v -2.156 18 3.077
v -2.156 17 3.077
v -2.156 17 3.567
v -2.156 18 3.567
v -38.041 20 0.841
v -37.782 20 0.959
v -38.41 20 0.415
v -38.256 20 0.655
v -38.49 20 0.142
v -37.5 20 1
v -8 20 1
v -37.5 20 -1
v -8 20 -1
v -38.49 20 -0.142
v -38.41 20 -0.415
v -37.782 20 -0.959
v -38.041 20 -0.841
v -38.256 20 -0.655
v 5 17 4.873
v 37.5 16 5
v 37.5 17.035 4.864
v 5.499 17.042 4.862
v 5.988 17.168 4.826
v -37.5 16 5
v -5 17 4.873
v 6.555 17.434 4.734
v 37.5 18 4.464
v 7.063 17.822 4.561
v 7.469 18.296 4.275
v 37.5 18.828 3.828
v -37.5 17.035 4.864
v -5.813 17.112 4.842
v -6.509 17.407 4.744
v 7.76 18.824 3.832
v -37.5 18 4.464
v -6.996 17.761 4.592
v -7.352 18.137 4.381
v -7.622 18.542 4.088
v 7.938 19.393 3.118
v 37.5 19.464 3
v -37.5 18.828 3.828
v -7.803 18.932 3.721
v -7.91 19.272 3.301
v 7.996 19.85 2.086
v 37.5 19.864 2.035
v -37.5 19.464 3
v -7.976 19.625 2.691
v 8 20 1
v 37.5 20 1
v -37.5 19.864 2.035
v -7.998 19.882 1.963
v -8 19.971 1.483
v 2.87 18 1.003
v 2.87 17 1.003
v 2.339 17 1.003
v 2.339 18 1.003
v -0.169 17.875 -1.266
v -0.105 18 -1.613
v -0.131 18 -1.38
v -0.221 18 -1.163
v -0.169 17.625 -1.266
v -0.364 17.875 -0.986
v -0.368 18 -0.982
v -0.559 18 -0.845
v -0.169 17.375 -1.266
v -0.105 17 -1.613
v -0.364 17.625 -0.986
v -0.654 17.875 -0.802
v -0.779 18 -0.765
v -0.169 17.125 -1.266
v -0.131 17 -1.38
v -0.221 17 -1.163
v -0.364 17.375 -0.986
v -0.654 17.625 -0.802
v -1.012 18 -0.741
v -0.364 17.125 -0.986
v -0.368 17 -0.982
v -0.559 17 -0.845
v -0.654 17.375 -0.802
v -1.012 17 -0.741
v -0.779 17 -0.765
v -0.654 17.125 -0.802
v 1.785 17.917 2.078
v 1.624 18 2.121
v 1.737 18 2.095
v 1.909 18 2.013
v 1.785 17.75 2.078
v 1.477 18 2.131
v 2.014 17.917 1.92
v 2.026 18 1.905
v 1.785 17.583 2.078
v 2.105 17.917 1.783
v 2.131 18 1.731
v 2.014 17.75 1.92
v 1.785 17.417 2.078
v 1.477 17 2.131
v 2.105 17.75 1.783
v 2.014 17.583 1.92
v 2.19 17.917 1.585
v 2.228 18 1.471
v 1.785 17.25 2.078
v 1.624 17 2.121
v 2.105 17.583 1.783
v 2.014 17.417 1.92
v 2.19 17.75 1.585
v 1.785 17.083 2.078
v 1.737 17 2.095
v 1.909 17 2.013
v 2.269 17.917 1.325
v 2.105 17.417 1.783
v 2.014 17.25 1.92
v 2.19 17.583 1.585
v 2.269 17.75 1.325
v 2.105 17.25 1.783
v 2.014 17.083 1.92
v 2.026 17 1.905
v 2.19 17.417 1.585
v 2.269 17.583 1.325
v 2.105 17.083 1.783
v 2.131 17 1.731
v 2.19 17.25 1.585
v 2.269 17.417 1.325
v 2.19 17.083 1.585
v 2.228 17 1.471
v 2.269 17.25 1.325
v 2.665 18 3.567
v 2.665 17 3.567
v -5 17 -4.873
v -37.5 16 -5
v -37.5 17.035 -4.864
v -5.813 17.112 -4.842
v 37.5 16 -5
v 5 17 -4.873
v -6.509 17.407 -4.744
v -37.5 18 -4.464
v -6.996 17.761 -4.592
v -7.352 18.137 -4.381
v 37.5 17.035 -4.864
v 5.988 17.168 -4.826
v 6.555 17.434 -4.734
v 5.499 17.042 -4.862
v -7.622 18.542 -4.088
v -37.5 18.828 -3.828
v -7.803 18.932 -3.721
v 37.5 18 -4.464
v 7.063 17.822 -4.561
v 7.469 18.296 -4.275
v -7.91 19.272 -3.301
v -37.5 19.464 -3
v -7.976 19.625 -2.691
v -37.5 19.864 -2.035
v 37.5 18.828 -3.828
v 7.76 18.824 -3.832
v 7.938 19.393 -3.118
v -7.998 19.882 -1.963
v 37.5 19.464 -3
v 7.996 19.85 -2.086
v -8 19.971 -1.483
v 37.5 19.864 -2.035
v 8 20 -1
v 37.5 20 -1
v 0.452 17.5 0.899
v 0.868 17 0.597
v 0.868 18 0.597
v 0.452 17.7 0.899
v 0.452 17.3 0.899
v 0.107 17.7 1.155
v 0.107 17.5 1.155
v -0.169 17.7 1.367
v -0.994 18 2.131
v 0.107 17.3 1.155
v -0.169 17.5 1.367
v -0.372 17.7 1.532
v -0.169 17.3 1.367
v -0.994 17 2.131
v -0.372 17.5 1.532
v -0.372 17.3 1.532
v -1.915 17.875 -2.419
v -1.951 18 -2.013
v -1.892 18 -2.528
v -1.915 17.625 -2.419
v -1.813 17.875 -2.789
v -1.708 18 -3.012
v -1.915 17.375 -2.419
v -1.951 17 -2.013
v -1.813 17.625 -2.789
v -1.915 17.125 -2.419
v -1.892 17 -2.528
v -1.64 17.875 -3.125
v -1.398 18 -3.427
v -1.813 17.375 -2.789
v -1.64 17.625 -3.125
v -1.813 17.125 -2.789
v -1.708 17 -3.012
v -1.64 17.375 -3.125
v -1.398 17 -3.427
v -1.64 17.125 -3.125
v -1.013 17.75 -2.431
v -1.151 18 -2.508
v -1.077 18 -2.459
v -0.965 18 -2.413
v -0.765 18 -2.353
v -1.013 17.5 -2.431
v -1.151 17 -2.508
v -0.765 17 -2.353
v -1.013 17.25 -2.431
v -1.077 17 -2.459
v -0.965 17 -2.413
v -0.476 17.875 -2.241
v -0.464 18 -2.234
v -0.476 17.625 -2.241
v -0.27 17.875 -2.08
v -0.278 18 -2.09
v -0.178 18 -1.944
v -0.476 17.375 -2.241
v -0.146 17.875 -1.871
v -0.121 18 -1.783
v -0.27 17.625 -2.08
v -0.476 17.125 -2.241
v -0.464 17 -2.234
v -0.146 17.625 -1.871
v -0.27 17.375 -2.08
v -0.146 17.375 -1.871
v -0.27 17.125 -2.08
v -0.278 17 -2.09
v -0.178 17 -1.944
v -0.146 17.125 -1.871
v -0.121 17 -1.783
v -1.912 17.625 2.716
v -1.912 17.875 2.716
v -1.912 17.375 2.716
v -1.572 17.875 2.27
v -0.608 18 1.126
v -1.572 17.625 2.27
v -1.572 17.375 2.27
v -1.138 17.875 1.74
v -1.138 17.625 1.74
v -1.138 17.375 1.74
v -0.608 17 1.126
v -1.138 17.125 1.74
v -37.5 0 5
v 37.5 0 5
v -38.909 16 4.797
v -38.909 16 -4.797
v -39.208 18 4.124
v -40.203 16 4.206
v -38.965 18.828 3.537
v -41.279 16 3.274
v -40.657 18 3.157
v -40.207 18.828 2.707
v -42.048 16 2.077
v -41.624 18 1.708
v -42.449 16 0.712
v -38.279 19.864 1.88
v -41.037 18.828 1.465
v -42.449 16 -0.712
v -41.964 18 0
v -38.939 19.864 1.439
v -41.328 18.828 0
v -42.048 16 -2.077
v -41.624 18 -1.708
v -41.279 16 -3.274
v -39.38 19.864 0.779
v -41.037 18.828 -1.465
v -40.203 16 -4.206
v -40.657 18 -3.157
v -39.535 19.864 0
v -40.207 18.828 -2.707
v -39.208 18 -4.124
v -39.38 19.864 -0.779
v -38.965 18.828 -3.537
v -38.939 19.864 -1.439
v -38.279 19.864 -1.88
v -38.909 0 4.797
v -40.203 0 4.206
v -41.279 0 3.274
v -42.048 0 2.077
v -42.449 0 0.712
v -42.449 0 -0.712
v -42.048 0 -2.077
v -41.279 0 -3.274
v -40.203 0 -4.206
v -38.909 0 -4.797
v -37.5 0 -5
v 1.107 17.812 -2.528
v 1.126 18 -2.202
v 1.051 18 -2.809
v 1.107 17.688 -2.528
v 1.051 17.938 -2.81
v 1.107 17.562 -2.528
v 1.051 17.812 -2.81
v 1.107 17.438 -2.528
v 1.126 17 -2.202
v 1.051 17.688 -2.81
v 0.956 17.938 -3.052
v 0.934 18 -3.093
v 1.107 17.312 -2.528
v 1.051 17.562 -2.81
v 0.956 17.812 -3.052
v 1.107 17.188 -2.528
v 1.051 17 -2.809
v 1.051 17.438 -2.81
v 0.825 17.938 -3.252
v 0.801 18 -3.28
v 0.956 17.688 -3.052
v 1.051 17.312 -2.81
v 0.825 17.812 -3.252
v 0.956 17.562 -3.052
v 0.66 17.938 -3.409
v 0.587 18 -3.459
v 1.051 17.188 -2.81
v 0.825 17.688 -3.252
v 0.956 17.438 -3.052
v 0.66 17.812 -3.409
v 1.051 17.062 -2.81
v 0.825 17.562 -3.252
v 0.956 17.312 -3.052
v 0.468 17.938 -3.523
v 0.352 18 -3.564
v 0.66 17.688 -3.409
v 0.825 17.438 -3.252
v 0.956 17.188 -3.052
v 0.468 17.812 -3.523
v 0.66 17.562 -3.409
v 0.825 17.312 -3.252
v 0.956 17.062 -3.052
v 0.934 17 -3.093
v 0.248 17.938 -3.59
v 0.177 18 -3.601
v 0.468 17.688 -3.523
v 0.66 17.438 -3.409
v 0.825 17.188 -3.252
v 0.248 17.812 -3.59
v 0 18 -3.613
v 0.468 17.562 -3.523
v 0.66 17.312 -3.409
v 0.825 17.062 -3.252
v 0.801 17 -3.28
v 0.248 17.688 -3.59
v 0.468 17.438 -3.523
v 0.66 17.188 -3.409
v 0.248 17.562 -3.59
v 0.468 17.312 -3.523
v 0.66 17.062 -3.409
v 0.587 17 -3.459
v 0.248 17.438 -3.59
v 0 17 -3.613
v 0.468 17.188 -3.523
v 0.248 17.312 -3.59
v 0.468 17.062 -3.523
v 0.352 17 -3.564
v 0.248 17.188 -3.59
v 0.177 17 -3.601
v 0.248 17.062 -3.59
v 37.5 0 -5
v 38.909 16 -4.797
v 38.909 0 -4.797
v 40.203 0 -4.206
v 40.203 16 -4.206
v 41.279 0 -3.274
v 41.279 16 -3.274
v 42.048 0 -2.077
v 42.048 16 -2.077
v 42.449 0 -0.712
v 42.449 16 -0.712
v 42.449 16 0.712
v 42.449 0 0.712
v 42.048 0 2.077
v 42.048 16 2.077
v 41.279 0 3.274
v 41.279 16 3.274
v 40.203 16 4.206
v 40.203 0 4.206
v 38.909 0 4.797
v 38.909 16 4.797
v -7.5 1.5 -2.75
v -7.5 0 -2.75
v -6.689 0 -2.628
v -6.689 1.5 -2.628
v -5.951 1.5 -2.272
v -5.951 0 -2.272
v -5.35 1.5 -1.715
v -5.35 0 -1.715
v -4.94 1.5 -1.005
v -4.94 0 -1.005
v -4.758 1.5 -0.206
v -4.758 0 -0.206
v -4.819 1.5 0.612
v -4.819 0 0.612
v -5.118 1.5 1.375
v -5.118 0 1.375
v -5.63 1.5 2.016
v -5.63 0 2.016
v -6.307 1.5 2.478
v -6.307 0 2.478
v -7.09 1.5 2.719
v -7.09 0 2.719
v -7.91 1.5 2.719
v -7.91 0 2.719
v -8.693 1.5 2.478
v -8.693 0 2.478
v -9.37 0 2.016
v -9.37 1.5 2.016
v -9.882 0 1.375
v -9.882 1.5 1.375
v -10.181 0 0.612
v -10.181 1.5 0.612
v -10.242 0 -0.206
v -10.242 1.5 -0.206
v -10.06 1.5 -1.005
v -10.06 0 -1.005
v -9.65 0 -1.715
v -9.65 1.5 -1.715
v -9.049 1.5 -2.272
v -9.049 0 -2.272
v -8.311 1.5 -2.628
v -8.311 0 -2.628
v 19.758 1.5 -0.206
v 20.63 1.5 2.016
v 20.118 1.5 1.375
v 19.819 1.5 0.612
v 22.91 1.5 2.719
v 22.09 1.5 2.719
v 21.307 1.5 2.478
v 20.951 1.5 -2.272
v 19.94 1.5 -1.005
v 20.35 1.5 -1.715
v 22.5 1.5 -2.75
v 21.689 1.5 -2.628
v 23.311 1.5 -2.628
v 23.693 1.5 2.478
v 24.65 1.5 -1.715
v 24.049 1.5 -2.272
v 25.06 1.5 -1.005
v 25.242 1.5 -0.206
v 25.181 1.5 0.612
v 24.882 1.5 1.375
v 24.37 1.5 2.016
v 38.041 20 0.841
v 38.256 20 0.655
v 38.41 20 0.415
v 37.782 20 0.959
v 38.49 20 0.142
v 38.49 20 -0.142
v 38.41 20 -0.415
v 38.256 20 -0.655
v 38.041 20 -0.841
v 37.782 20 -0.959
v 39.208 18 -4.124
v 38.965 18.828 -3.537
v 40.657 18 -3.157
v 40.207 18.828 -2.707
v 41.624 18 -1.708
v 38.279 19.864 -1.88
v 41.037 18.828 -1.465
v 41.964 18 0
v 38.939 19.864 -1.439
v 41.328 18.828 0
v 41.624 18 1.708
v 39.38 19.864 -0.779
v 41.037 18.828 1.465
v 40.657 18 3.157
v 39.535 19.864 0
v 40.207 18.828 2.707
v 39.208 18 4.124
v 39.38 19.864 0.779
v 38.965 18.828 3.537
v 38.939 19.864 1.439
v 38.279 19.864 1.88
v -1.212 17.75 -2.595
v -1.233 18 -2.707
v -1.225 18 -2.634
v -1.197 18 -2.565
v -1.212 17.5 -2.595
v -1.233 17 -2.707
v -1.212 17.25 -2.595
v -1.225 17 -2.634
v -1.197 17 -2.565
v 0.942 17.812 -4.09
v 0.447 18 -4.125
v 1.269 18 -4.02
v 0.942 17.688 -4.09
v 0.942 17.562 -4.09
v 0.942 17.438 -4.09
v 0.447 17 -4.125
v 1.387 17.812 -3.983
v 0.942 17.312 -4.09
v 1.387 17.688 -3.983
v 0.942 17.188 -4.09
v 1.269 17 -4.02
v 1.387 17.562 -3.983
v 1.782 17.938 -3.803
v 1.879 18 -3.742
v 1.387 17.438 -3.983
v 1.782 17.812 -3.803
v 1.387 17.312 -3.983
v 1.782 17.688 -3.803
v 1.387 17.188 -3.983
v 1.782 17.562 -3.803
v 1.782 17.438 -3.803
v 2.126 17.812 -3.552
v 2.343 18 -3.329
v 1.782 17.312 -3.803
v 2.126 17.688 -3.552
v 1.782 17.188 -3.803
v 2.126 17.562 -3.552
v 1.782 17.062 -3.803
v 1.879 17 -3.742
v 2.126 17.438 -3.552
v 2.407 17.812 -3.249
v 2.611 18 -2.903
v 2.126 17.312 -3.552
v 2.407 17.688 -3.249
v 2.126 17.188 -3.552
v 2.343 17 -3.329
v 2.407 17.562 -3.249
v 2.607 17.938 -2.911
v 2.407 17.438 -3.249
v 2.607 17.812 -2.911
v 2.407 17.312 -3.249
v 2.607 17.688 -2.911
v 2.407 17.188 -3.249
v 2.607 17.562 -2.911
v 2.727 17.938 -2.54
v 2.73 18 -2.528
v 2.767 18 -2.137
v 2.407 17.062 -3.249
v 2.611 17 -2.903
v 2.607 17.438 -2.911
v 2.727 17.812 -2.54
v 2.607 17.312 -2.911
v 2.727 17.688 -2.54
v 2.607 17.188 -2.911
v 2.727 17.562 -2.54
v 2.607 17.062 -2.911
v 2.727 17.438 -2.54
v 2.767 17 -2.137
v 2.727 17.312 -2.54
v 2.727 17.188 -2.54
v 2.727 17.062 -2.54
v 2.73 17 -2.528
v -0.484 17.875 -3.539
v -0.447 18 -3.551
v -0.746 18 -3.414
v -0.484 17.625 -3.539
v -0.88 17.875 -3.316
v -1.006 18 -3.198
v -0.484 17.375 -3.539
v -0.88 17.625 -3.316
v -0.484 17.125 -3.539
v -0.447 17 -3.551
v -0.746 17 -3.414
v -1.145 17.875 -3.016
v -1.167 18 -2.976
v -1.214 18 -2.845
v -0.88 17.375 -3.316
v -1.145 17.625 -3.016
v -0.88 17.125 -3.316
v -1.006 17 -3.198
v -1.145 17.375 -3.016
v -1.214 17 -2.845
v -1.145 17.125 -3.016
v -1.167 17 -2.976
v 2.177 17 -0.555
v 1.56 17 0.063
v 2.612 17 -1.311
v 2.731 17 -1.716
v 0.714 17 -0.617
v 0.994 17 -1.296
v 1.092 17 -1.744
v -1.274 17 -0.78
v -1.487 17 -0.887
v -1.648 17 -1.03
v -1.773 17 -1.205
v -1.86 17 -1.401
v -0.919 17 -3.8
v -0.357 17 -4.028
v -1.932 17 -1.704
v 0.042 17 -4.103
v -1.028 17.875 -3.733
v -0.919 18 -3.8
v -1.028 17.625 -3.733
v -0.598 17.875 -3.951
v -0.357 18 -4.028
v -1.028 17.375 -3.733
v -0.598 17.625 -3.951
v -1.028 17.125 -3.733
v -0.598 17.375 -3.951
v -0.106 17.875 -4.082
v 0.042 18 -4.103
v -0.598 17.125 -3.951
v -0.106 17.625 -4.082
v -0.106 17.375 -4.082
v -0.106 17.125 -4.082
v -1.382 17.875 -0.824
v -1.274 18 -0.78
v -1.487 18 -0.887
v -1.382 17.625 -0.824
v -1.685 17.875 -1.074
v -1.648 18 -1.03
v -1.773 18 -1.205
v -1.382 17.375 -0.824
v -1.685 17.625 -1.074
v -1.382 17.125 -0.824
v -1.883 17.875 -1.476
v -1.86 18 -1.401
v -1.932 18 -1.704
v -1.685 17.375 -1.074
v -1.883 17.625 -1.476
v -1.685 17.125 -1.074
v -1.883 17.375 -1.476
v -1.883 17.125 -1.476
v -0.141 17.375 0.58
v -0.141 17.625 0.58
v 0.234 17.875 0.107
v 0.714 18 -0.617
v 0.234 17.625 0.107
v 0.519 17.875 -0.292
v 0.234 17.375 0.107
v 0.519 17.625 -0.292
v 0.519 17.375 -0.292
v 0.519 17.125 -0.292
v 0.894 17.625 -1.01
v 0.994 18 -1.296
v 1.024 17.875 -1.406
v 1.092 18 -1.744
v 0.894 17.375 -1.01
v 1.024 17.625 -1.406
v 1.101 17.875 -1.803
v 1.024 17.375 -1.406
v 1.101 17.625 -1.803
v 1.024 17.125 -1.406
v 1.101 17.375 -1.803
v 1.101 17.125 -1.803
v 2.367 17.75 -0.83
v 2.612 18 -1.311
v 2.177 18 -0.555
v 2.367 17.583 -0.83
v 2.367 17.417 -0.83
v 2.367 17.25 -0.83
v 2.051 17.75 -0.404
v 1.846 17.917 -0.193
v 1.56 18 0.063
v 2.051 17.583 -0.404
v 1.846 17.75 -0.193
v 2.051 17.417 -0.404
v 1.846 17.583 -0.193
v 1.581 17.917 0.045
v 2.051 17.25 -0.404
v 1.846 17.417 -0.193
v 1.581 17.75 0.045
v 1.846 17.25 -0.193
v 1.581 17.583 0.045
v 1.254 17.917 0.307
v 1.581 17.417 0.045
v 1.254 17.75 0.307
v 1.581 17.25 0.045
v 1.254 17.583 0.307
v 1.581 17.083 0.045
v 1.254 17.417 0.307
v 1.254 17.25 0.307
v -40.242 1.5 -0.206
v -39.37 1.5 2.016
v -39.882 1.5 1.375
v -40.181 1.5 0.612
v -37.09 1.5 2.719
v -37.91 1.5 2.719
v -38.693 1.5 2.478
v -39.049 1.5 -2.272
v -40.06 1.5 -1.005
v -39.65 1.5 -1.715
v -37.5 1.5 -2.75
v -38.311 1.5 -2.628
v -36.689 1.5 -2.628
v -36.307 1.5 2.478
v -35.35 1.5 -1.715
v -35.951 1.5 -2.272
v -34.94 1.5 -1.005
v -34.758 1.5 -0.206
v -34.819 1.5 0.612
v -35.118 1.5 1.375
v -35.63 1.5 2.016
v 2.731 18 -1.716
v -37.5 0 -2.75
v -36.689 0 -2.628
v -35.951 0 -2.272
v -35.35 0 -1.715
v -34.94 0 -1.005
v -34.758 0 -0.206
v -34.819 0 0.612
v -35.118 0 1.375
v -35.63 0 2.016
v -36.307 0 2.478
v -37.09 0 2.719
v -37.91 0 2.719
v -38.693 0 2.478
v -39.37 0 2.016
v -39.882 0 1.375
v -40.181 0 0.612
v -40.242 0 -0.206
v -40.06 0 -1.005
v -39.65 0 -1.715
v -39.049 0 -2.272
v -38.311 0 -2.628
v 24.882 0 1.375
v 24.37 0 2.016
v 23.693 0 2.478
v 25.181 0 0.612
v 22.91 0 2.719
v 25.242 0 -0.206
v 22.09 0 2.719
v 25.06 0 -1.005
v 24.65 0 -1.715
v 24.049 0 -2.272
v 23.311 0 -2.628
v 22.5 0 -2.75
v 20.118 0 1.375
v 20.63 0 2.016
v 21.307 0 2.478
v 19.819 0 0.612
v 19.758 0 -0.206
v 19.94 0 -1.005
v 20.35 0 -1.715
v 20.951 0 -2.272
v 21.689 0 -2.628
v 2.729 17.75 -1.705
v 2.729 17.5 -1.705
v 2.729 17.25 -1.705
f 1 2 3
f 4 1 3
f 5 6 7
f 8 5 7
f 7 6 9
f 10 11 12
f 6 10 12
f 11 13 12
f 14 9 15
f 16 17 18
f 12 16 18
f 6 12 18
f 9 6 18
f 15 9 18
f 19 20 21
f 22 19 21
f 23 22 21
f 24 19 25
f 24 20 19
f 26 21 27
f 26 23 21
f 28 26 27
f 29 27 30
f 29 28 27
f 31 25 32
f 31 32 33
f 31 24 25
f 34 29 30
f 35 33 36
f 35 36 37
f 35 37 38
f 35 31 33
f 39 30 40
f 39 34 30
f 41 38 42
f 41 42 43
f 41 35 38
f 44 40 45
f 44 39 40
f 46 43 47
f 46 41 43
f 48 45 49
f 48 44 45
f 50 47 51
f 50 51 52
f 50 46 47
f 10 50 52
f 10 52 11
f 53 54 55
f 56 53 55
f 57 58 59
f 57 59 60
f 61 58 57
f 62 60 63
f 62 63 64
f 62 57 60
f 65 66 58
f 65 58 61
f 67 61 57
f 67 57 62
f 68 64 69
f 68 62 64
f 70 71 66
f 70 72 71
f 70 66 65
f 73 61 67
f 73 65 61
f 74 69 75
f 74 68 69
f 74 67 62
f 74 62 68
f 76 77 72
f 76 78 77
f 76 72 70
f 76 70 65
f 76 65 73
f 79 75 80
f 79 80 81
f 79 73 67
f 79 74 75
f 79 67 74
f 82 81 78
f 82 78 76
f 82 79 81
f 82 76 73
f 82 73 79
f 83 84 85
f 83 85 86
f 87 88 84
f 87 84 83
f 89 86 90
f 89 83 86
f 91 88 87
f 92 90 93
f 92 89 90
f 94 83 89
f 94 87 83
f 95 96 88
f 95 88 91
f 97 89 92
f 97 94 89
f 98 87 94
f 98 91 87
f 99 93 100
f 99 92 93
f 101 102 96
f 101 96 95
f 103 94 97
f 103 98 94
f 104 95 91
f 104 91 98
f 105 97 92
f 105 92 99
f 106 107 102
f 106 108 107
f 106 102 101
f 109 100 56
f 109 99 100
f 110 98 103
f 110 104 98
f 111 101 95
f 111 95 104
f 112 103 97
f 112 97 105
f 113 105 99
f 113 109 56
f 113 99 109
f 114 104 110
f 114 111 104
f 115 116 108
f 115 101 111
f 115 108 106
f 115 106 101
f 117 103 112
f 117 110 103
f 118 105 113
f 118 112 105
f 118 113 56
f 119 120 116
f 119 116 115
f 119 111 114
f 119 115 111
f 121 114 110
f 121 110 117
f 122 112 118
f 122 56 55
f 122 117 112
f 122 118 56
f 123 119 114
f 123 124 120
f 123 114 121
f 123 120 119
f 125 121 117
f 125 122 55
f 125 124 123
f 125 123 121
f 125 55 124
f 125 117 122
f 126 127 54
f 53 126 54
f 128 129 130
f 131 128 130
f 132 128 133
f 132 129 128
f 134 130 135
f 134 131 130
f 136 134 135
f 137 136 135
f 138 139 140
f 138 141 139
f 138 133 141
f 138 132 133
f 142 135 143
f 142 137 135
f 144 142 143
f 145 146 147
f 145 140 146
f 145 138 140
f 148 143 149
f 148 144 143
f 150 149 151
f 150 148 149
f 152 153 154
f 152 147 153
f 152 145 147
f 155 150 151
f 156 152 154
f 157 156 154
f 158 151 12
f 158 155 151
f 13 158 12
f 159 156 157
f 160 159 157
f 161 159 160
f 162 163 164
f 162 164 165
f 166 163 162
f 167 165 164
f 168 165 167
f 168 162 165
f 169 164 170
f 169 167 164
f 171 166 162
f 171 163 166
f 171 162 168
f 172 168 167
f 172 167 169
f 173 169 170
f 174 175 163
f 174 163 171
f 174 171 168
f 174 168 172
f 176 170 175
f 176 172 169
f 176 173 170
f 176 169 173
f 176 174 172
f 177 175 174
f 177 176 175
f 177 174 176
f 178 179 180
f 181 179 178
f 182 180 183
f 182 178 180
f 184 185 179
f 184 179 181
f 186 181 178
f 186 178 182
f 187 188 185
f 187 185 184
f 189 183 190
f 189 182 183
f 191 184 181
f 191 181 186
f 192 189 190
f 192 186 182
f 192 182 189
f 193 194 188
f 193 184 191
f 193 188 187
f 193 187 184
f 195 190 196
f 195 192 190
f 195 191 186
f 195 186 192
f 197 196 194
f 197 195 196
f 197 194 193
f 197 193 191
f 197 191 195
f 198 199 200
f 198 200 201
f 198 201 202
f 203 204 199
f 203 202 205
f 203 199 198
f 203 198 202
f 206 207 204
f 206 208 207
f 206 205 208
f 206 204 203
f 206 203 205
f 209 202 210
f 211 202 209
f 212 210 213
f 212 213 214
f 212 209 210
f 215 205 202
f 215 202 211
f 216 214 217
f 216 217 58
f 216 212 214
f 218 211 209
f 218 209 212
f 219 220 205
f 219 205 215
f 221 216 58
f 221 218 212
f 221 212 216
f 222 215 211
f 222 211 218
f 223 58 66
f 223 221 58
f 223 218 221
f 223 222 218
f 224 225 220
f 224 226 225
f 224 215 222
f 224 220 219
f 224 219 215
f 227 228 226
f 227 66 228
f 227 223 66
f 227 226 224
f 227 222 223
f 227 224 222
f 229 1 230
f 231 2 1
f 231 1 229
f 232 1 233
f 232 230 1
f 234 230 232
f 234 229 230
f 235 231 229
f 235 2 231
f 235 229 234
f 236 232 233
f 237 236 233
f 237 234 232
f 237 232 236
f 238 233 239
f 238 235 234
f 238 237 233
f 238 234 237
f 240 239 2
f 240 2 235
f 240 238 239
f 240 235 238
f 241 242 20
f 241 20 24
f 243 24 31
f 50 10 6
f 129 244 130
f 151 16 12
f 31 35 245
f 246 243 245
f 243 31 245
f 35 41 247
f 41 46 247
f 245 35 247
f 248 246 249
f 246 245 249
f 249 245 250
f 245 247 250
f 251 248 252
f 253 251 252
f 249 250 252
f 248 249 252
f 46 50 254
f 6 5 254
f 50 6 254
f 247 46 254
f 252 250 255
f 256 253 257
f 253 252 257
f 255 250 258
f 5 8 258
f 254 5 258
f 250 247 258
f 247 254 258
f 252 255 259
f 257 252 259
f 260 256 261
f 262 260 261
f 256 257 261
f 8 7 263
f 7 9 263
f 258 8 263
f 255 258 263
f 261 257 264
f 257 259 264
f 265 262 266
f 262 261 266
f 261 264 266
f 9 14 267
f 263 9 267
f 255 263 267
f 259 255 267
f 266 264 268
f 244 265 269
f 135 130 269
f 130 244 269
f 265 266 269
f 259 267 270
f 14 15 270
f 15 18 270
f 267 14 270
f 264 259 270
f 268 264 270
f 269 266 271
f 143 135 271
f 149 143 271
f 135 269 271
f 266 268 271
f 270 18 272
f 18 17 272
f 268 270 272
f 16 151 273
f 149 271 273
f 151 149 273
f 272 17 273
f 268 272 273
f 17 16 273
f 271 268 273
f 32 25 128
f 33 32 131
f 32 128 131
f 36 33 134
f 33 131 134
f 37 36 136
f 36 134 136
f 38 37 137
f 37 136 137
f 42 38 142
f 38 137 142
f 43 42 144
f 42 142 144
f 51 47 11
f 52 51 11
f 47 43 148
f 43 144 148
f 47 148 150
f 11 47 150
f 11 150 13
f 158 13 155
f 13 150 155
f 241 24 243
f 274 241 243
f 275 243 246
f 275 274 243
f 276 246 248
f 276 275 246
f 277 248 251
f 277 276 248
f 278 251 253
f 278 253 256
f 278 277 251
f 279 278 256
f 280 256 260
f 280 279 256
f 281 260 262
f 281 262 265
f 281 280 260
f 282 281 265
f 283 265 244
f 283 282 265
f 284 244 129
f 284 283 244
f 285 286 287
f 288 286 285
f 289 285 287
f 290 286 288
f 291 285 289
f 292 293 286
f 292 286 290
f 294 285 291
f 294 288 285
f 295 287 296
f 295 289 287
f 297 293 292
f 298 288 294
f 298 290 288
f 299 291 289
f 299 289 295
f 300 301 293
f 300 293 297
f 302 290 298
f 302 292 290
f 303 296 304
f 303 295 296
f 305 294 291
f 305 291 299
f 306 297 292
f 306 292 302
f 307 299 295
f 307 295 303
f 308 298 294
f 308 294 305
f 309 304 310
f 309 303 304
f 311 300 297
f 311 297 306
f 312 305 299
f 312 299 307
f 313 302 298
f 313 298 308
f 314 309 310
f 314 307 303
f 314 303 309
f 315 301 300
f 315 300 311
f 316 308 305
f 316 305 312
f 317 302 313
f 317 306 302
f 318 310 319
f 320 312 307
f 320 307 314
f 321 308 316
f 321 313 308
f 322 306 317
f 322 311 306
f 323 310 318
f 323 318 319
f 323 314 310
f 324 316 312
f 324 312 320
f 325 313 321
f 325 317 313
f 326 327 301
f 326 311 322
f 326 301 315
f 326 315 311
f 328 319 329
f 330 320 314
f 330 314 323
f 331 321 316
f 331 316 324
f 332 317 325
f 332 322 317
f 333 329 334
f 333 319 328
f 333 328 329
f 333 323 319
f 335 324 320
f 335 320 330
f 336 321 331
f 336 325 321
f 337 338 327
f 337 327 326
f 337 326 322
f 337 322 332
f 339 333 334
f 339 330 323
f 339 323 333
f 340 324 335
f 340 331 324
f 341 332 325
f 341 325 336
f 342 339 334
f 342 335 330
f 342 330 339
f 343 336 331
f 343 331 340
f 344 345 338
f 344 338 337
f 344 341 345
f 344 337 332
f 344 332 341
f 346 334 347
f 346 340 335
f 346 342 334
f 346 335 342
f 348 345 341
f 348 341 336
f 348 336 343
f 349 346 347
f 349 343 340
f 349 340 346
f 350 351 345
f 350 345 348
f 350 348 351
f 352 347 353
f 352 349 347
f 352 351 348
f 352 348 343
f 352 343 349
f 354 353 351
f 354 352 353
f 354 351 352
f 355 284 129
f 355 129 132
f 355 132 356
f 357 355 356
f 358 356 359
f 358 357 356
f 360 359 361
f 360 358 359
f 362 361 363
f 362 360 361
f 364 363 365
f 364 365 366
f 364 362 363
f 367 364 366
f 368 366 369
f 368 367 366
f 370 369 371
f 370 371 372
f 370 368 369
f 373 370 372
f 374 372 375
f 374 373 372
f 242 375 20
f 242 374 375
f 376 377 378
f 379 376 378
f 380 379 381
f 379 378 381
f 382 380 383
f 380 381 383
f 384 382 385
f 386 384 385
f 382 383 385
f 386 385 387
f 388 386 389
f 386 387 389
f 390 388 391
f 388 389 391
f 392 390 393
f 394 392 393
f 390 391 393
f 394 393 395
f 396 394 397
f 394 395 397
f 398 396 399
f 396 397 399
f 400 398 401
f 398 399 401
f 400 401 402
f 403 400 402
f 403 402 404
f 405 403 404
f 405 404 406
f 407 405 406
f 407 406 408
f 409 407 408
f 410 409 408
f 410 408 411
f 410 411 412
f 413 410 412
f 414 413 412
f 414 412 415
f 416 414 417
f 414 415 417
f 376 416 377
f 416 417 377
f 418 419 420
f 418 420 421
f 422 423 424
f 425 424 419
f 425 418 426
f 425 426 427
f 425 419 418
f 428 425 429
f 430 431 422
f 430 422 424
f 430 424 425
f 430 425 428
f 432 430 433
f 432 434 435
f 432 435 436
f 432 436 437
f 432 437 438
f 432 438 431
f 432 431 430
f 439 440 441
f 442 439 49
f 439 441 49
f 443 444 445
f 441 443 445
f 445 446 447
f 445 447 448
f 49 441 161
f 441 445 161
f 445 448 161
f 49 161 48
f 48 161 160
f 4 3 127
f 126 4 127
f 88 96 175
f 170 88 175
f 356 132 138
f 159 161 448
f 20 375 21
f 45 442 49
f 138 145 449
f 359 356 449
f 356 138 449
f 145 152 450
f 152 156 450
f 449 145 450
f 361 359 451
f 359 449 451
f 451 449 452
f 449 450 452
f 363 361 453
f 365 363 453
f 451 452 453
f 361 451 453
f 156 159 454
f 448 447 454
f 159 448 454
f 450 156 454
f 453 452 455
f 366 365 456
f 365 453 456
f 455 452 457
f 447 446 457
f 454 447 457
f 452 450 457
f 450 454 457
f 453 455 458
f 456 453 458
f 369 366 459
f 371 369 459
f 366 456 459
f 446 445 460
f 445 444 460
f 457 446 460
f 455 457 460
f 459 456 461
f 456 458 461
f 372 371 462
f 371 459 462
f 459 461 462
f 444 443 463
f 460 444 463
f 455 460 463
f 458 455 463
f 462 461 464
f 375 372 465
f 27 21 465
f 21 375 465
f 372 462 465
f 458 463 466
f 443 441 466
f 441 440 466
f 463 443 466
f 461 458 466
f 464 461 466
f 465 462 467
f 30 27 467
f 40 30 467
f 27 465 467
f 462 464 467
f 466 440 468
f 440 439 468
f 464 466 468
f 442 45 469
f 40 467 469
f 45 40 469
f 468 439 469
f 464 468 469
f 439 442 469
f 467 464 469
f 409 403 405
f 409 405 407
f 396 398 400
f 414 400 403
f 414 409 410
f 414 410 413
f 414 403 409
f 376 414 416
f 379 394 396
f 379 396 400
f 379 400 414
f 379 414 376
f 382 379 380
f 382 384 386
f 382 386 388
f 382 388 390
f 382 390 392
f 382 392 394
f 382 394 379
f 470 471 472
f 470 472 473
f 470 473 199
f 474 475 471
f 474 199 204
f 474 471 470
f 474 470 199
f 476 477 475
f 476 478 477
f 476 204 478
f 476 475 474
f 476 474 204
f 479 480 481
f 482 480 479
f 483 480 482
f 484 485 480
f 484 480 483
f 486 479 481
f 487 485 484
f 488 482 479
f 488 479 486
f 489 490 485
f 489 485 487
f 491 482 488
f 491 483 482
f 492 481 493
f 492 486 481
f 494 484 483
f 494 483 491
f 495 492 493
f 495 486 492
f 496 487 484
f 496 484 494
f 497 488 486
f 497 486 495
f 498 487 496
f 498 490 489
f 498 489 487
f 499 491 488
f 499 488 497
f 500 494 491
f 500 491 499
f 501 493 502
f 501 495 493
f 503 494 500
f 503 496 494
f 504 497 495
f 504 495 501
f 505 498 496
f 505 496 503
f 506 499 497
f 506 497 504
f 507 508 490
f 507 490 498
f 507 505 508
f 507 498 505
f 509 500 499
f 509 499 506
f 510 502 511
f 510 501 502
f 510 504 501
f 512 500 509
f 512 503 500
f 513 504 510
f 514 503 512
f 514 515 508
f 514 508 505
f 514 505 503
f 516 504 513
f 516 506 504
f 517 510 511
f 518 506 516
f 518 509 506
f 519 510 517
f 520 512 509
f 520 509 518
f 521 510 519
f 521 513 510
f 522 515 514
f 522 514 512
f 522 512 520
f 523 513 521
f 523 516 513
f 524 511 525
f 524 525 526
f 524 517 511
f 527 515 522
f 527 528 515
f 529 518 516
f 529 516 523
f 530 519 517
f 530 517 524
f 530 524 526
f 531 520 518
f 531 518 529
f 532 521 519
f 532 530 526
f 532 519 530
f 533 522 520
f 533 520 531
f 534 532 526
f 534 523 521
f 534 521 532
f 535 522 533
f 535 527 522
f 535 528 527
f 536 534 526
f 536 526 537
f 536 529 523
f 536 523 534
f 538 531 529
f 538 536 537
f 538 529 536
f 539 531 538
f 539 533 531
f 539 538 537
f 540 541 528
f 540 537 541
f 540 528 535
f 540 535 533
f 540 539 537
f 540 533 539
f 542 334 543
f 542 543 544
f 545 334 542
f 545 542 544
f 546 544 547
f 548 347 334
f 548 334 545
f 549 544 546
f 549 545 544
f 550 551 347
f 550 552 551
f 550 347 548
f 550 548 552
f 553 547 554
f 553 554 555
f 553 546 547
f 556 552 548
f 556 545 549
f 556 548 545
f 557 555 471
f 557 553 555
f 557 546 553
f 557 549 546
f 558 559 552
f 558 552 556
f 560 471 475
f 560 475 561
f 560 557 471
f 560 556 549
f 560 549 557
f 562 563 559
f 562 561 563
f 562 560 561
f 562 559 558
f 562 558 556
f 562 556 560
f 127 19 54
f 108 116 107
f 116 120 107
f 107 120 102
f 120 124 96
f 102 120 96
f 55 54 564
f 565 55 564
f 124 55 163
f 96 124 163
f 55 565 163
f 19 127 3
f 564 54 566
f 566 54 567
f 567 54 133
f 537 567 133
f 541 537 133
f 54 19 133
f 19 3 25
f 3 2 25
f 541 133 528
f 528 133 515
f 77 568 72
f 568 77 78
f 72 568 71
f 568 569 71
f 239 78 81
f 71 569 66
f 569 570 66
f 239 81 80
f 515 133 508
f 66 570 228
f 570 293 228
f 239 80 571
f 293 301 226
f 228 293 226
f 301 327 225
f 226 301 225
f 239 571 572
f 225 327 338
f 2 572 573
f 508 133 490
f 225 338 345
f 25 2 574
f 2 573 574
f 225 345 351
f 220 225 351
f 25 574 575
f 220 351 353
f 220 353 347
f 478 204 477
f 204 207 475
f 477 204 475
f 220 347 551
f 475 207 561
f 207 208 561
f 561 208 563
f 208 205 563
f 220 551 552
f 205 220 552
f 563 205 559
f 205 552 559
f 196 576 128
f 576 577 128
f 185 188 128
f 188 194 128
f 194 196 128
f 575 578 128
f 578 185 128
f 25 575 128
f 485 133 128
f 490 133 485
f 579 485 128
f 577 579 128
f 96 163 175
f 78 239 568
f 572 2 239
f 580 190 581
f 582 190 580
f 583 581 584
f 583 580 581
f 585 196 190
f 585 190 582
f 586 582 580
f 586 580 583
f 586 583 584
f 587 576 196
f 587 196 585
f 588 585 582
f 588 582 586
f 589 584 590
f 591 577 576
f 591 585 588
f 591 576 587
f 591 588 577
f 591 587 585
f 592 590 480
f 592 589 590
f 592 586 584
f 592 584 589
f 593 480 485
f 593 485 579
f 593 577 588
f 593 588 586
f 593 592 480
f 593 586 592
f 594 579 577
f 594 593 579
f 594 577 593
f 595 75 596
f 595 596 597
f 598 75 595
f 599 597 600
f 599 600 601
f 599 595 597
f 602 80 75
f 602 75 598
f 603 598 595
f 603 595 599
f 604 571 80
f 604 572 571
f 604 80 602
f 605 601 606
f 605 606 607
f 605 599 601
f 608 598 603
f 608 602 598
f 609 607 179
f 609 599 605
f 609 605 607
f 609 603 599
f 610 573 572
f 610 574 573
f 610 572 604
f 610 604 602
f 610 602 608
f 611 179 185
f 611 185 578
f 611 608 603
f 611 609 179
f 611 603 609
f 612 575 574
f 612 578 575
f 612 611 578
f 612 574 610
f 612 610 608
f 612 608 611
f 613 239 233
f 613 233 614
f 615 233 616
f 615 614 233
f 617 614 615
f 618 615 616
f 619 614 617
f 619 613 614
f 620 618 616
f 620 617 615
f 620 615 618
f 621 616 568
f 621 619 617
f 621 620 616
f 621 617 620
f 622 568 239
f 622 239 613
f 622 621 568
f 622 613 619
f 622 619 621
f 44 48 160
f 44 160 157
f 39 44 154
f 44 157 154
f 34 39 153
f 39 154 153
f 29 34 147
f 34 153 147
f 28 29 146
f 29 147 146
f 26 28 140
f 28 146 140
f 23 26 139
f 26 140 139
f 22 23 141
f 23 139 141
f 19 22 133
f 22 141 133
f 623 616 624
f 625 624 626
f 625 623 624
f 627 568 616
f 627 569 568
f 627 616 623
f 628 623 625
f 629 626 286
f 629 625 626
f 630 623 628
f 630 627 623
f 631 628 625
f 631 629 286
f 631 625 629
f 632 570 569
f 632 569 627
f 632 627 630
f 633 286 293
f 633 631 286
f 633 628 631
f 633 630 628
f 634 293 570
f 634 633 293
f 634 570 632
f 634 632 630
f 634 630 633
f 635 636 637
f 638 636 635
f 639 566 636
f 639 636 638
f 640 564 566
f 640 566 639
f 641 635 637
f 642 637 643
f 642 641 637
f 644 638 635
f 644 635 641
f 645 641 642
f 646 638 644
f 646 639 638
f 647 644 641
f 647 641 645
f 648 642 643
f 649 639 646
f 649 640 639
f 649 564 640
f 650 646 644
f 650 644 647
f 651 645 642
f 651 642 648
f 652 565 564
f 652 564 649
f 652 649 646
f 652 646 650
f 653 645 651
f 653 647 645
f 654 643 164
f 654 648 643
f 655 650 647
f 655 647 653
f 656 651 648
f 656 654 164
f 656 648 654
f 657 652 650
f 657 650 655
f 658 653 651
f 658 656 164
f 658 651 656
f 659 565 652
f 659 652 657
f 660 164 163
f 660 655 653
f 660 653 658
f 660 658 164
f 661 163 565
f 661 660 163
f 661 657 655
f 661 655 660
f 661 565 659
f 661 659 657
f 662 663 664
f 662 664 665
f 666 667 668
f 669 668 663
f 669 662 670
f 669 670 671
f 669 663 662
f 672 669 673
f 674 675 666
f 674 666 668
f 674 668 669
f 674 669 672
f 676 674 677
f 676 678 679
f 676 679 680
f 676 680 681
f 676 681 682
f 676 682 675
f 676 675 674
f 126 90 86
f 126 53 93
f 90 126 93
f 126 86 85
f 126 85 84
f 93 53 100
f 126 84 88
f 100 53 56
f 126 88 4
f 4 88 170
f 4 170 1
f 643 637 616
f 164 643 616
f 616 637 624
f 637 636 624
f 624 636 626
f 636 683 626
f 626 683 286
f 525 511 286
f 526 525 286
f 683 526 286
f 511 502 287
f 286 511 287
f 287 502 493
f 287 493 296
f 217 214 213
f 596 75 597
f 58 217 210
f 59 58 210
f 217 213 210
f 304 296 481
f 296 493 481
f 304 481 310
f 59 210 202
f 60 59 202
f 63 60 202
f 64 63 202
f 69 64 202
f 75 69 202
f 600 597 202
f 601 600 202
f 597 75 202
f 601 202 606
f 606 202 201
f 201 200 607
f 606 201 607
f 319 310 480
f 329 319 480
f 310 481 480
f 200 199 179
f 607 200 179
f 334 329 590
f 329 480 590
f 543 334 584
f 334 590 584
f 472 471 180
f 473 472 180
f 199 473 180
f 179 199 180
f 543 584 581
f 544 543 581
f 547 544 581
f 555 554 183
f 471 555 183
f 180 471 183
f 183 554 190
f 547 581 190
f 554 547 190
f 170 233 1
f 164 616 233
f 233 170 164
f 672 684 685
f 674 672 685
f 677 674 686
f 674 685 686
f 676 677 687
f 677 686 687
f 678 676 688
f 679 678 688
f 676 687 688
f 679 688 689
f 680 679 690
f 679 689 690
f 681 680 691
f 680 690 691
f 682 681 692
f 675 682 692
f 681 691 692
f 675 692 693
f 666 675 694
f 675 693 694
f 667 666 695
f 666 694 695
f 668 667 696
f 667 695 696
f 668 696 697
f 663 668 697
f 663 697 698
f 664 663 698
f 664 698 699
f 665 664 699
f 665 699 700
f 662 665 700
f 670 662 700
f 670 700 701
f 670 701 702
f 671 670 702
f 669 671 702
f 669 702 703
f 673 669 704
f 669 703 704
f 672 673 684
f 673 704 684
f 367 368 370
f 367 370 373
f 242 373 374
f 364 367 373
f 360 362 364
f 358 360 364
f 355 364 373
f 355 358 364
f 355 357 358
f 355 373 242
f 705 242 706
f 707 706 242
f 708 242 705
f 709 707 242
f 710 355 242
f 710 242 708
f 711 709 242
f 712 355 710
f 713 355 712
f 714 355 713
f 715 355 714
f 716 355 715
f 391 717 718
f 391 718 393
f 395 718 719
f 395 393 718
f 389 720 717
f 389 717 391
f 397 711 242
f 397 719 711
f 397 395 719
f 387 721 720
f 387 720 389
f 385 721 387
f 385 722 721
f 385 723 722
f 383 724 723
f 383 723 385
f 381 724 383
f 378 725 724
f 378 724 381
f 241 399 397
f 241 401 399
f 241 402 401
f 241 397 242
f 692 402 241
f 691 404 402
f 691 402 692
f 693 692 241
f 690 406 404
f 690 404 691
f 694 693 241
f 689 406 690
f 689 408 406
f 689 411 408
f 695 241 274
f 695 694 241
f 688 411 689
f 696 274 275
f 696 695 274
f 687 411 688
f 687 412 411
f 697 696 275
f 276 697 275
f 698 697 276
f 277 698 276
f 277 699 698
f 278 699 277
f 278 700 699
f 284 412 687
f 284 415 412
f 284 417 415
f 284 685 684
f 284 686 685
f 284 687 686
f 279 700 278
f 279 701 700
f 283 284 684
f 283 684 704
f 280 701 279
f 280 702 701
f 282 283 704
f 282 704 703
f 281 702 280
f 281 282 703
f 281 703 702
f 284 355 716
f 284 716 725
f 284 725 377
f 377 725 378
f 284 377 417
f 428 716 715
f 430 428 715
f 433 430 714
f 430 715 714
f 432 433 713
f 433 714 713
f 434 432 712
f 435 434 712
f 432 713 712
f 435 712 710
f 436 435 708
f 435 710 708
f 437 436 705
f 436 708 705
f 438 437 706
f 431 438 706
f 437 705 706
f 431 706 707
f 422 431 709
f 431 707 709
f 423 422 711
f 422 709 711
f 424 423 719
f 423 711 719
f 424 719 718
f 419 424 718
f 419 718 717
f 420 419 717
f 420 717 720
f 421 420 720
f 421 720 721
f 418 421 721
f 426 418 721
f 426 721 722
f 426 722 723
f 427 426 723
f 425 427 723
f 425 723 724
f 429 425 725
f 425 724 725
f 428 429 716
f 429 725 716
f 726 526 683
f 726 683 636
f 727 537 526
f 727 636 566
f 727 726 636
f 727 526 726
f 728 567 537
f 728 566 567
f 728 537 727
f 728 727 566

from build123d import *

# Parameters (mm, degrees)
BOSS_EXTRUDE1_DEPTH     = 20
FILLET1_R               = 4
SKETCH2_R               = 2.75
CUT_EXTRUDE1_DEPTH      = 1.5
LPATTERN1_COUNT         = 3
LPATTERN1_PITCH         = 30
CUT_EXTRUDE2_DEPTH      = 48.236109069
CUT_EXTRUDE2_DEPTH_BACK = 48.236109069
WRAP1_DEPTH             = 1


# Read off the part's stored shape, not the designer's step: Wrap1
with BuildPart() as part:
    # Sketch1 → Boss-Extrude1 (new body)
    with BuildSketch(Plane(origin=(0, 0, 0), x_dir=(1, 0, 0), z_dir=(0, 1, 0))):
        with BuildLine():
            Line((37.5, -5), (-37.5, -5))
            ThreePointArc((-37.5, -5), (-42.5, 0), (-37.5, 5))
            Line((-37.5, 5), (37.5, 5))
            ThreePointArc((37.5, 5), (42.5, 0), (37.5, -5))
        make_face()
    extrude(amount=BOSS_EXTRUDE1_DEPTH)

    # Fillet1
    fillet1_edges = [part.edges().sort_by_distance(p)[0] for p in [
        (-42.5, 20, 0),
        (0, 20, 5),
        (42.5, 20, 0),
        (0, 20, -5),
    ]]
    fillet(fillet1_edges, radius=FILLET1_R)

    # Sketch2 → Cut-Extrude1 (cut)
    with BuildSketch(Plane.XZ):
        with Locations(Location((-37.5, 0, 0), (0, 0, 270))):
            Circle(SKETCH2_R)
    cut_extrude1 = extrude(amount=-CUT_EXTRUDE1_DEPTH, mode=Mode.SUBTRACT)

    # LPattern1: Cut-Extrude1 ×3
    with Locations(*[(i * LPATTERN1_PITCH, 0, 0) for i in range(1, LPATTERN1_COUNT)]):
        add(cut_extrude1, mode=Mode.SUBTRACT)

    # Sketch3 → Cut-Extrude2 (cut, two sides: drawn at the far end of the back side and taken through both)
    with BuildSketch(Plane.XY.offset(-CUT_EXTRUDE2_DEPTH_BACK)):
        with BuildLine():
            Line((-5, 23), (5, 23))
            ThreePointArc((5, 23), (8, 20), (5, 17))
            Line((5, 17), (-5, 17))
            ThreePointArc((-5, 17), (-8, 20), (-5, 23))
        make_face()
    extrude(amount=CUT_EXTRUDE2_DEPTH + CUT_EXTRUDE2_DEPTH_BACK, mode=Mode.SUBTRACT)

    # Wrap1 outline → Wrap1 (add)
    with BuildSketch(Plane(origin=(0, 17, 0), x_dir=(1, 0, 0), z_dir=(0, 1, 0))):
        with BuildLine():
            add(Edge.make_bspline(
                [(1.477179672, -2.131048558), (1.531961531, -2.129025799), (1.636756934, -2.125156347), (1.784042683, -2.083710764), (1.912739128, -2.017798162), (2.002734413, -1.937441096), (2.063880351, -1.856422731), (2.108803156, -1.780024303), (2.151677105, -1.688112446), (2.192727948, -1.580807318), (2.232736726, -1.458316815), (2.27140835, -1.320528166), (2.305449427, -1.166588854), (2.327738483, -1.058958074), (2.339359159, -1.00284343)],
                knots=[0, 0, 0, 0, 0.10403341, 0.199011557, 0.288612319, 0.377191825, 0.425797175, 0.481425289, 0.545557079, 0.61863331, 0.699984683, 0.790771883, 0.890916323, 1, 1, 1, 1], degree=3))
            Line((1.477179672, -2.131048558), (-0.993974174, -2.131048558))
            add(Edge.make_bspline(
                [(0.868205313, -0.597394712), (0.79621048, -0.649910777), (0.657741061, -0.750916207), (0.456580944, -0.893601927), (0.27646951, -1.029215281), (0.111636193, -1.150958881), (-0.034458066, -1.262447791), (-0.163409095, -1.362077669), (-0.274143139, -1.450060052), (-0.45325139, -1.598443158), (-0.698599089, -1.817172559), (-0.896074552, -2.027016962), (-0.993974174, -2.131048558)],
                knots=[0, 0, 0, 0, 0.110593572, 0.212707314, 0.306051588, 0.390379305, 0.467018215, 0.534117187, 0.592614819, 0.642525788, 0.822780058, 1, 1, 1, 1], degree=3))
            add(Edge.make_bspline(
                [(2.611795057, 1.311259134), (2.575402231, 1.227702286), (2.503450629, 1.062503542), (2.369097378, 0.829017261), (2.221591228, 0.607376082), (2.079695352, 0.434265273), (1.953675403, 0.296924311), (1.842689454, 0.188702281), (1.717579256, 0.073349805), (1.577787564, -0.048748331), (1.422213899, -0.176924213), (1.250181802, -0.310729341), (1.06539278, -0.453791096), (0.935229638, -0.548583621), (0.868205313, -0.597394712)],
                knots=[0, 0, 0, 0, 0.10413489, 0.205883221, 0.307528832, 0.408265615, 0.461433854, 0.520606469, 0.585444086, 0.656004792, 0.732803839, 0.815893726, 0.905198979, 1, 1, 1, 1], degree=3))
            add(Edge.make_bspline(
                [(2.767243775, 2.136579647), (2.765476042, 2.062762359), (2.762016076, 1.918280503), (2.73244702, 1.70614551), (2.6833885, 1.503661888), (2.635496742, 1.374955883), (2.611795057, 1.311259134)],
                knots=[0, 0, 0, 0, 0.261979501, 0.512769921, 0.758869279, 1, 1, 1, 1], degree=3))
            add(Edge.make_bspline(
                [(0.446730954, 4.125361698), (0.531185697, 4.123275975), (0.696746898, 4.119187219), (0.939241519, 4.094203646), (1.169092432, 4.04891417), (1.386926246, 3.987244257), (1.590639541, 3.904356397), (1.783380165, 3.807151368), (1.961901465, 3.688660444), (2.12755051, 3.554901637), (2.277544806, 3.408600033), (2.408670906, 3.251890691), (2.519920579, 3.086706843), (2.609878279, 2.912173499), (2.68146261, 2.730376132), (2.730374873, 2.539782347), (2.762493821, 2.341195944), (2.765641094, 2.205619187), (2.767243775, 2.136579647)],
                knots=[0, 0, 0, 0, 0.074102612, 0.14526736, 0.21355926, 0.279416432, 0.343556942, 0.406228654, 0.468492489, 0.531146675, 0.592790073, 0.652016559, 0.710119813, 0.767135501, 0.823967905, 0.881147087, 0.939476717, 1, 1, 1, 1], degree=3))
            add(Edge.make_bspline(
                [(-1.397820328, 3.42664375), (-1.339685121, 3.482468658), (-1.223933781, 3.593620027), (-1.029988725, 3.73621049), (-0.821845174, 3.857829356), (-0.597170186, 3.955349696), (-0.357859278, 4.032519936), (-0.102825371, 4.086723136), (0.167059066, 4.118844208), (0.3520908, 4.123156198), (0.446730954, 4.125361698)],
                knots=[0, 0, 0, 0, 0.119107626, 0.23715177, 0.355050392, 0.47498588, 0.598670295, 0.726365388, 0.860041186, 1, 1, 1, 1], degree=3))
            add(Edge.make_bspline(
                [(-1.950704943, 2.013182211), (-1.949501261, 2.082193438), (-1.947130604, 2.218111311), (-1.918428152, 2.417004203), (-1.875210504, 2.607330065), (-1.816463805, 2.790033991), (-1.737178724, 2.962937631), (-1.641872629, 3.127763446), (-1.530076028, 3.284407224), (-1.442173454, 3.378943465), (-1.397820328, 3.42664375)],
                knots=[0, 0, 0, 0, 0.132803649, 0.26155729, 0.386082589, 0.508400008, 0.630401232, 0.751619273, 0.874674186, 1, 1, 1, 1], degree=3))
            add(Edge.make_bspline(
                [(-1.011602379, 0.740746314), (-1.076799531, 0.74447446), (-1.204521956, 0.751777966), (-1.386461074, 0.818290605), (-1.550070508, 0.925271117), (-1.69322001, 1.073400563), (-1.811500845, 1.259061279), (-1.890938186, 1.482580071), (-1.943991337, 1.736660149), (-1.9483889, 1.917788326), (-1.950704943, 2.013182211)],
                knots=[0, 0, 0, 0, 0.110139331, 0.215764983, 0.323707128, 0.438906263, 0.562183724, 0.693638164, 0.838649921, 1, 1, 1, 1], degree=3))
            add(Edge.make_bspline(
                [(-0.104551097, 1.612541186), (-0.107433277, 1.55184237), (-0.113041089, 1.433741609), (-0.162702617, 1.264530911), (-0.246008733, 1.112720856), (-0.36059696, 0.981658482), (-0.497861102, 0.874736466), (-0.653954588, 0.794785259), (-0.828098239, 0.750308211), (-0.94939653, 0.74398769), (-1.011602379, 0.740746314)],
                knots=[0, 0, 0, 0, 0.129242333, 0.251464839, 0.372304265, 0.495878621, 0.620081591, 0.741344555, 0.867352775, 1, 1, 1, 1], degree=3))
            add(Edge.make_bspline(
                [(-0.764807507, 2.352925801), (-0.712490789, 2.337787093), (-0.613060164, 2.309015197), (-0.477694691, 2.245410486), (-0.363497683, 2.17010385), (-0.266944344, 2.084386734), (-0.194142589, 1.983320843), (-0.142356861, 1.870047676), (-0.108753882, 1.745331032), (-0.105978345, 1.657636068), (-0.104551097, 1.612541186)],
                knots=[0, 0, 0, 0, 0.151156851, 0.287281401, 0.413669873, 0.530293514, 0.644009236, 0.756908248, 0.874996313, 1, 1, 1, 1], degree=3))
            add(Edge.make_bspline(
                [(-1.151025456, 2.508374519), (-1.133287913, 2.494836068), (-1.091141008, 2.462666798), (-1.005178361, 2.42780874), (-0.895290257, 2.386647547), (-0.811045884, 2.364875571), (-0.764807507, 2.352925801)],
                knots=[0, 0, 0, 0, 0.159109439, 0.378066483, 0.65864549, 1, 1, 1, 1], degree=3))
            add(Edge.make_bspline(
                [(-1.232756225, 2.707092468), (-1.232081899, 2.687184305), (-1.230781196, 2.648783562), (-1.21372537, 2.594957911), (-1.188222188, 2.546850656), (-1.163446829, 2.521223132), (-1.151025456, 2.508374519)],
                knots=[0, 0, 0, 0, 0.268945253, 0.518766978, 0.758729042, 1, 1, 1, 1], degree=3))
            add(Edge.make_bspline(
                [(-0.00038443, 3.612541186), (-0.085081224, 3.608833937), (-0.24886475, 3.601664997), (-0.483889311, 3.546755047), (-0.696299395, 3.452253769), (-0.880349687, 3.323453619), (-1.031886602, 3.177298589), (-1.146772165, 3.025778423), (-1.218404743, 2.867863556), (-1.228074056, 2.759544014), (-1.232756225, 2.707092468)],
                knots=[0, 0, 0, 0, 0.151816317, 0.293576777, 0.429964406, 0.566304914, 0.694365033, 0.806085808, 0.906100976, 1, 1, 1, 1], degree=3))
            add(Edge.make_bspline(
                [(1.126218134, 2.202284775), (1.125419382, 2.258418172), (1.123872297, 2.367141747), (1.108484739, 2.524352927), (1.087625139, 2.671598252), (1.052679442, 2.807704167), (1.012774581, 2.935365364), (0.958393781, 3.050865278), (0.898520263, 3.157786792), (0.826714952, 3.252443042), (0.749134805, 3.338292119), (0.661001364, 3.410228111), (0.568127793, 3.473318886), (0.468377407, 3.525349279), (0.360714304, 3.563257103), (0.247252366, 3.592895766), (0.125557638, 3.608210727), (0.042385847, 3.61107055), (-0.00038443, 3.612541186)],
                knots=[0, 0, 0, 0, 0.082284271, 0.159374645, 0.231497254, 0.300083139, 0.36523236, 0.427274673, 0.486932074, 0.544586116, 0.60112786, 0.656190593, 0.710940404, 0.765594865, 0.820607428, 0.877984079, 0.93725451, 1, 1, 1, 1], degree=3))
            add(Edge.make_bspline(
                [(0.714359159, 0.617348878), (0.747261882, 0.682124329), (0.812482722, 0.810524323), (0.894486195, 1.008253415), (0.968284969, 1.205271239), (1.025200713, 1.404323571), (1.07052621, 1.603312874), (1.102444977, 1.802435759), (1.122559216, 2.002082393), (1.124996917, 2.135464326), (1.126218134, 2.202284775)],
                knots=[0, 0, 0, 0, 0.131745637, 0.261150462, 0.388067803, 0.513189353, 0.636374668, 0.758087597, 0.878808958, 1, 1, 1, 1], degree=3))
            add(Edge.make_bspline(
                [(-0.607756225, -1.126240866), (-0.526341272, -1.032411706), (-0.369395008, -0.851534171), (-0.147005377, -0.58818052), (0.052485983, -0.342553042), (0.228461917, -0.115210972), (0.383373607, 0.093014827), (0.514393948, 0.283577403), (0.625301777, 0.454674177), (0.686096112, 0.565722807), (0.714359159, 0.617348878)],
                knots=[0, 0, 0, 0, 0.170005554, 0.327725258, 0.471696803, 0.603008639, 0.721148947, 0.826797124, 0.919478664, 1, 1, 1, 1], degree=3))
            add(Edge.make_bspline(
                [(-2.155833148, -3.076561379), (-2.120077921, -3.019555215), (-2.042967512, -2.896614628), (-1.906171622, -2.707469654), (-1.750693337, -2.493359905), (-1.565930664, -2.262250728), (-1.361697851, -2.006814917), (-1.131972057, -1.731572481), (-0.87885055, -1.434992601), (-0.700428862, -1.231786555), (-0.607756225, -1.126240866)],
                knots=[0, 0, 0, 0, 0.080973991, 0.174630064, 0.280853316, 0.39944862, 0.530692677, 0.674513651, 0.830941638, 1, 1, 1, 1], degree=3))
            Line((-2.155833148, -3.076561379), (-2.155833148, -3.566945994))
            Line((-2.155833148, -3.566945994), (2.664679672, -3.566945994))
            Line((2.664679672, -3.566945994), (2.869807877, -1.00284343))
            Line((2.869807877, -1.00284343), (2.339359159, -1.00284343))
        make_face()
    extrude(amount=WRAP1_DEPTH)


solid = part.part
